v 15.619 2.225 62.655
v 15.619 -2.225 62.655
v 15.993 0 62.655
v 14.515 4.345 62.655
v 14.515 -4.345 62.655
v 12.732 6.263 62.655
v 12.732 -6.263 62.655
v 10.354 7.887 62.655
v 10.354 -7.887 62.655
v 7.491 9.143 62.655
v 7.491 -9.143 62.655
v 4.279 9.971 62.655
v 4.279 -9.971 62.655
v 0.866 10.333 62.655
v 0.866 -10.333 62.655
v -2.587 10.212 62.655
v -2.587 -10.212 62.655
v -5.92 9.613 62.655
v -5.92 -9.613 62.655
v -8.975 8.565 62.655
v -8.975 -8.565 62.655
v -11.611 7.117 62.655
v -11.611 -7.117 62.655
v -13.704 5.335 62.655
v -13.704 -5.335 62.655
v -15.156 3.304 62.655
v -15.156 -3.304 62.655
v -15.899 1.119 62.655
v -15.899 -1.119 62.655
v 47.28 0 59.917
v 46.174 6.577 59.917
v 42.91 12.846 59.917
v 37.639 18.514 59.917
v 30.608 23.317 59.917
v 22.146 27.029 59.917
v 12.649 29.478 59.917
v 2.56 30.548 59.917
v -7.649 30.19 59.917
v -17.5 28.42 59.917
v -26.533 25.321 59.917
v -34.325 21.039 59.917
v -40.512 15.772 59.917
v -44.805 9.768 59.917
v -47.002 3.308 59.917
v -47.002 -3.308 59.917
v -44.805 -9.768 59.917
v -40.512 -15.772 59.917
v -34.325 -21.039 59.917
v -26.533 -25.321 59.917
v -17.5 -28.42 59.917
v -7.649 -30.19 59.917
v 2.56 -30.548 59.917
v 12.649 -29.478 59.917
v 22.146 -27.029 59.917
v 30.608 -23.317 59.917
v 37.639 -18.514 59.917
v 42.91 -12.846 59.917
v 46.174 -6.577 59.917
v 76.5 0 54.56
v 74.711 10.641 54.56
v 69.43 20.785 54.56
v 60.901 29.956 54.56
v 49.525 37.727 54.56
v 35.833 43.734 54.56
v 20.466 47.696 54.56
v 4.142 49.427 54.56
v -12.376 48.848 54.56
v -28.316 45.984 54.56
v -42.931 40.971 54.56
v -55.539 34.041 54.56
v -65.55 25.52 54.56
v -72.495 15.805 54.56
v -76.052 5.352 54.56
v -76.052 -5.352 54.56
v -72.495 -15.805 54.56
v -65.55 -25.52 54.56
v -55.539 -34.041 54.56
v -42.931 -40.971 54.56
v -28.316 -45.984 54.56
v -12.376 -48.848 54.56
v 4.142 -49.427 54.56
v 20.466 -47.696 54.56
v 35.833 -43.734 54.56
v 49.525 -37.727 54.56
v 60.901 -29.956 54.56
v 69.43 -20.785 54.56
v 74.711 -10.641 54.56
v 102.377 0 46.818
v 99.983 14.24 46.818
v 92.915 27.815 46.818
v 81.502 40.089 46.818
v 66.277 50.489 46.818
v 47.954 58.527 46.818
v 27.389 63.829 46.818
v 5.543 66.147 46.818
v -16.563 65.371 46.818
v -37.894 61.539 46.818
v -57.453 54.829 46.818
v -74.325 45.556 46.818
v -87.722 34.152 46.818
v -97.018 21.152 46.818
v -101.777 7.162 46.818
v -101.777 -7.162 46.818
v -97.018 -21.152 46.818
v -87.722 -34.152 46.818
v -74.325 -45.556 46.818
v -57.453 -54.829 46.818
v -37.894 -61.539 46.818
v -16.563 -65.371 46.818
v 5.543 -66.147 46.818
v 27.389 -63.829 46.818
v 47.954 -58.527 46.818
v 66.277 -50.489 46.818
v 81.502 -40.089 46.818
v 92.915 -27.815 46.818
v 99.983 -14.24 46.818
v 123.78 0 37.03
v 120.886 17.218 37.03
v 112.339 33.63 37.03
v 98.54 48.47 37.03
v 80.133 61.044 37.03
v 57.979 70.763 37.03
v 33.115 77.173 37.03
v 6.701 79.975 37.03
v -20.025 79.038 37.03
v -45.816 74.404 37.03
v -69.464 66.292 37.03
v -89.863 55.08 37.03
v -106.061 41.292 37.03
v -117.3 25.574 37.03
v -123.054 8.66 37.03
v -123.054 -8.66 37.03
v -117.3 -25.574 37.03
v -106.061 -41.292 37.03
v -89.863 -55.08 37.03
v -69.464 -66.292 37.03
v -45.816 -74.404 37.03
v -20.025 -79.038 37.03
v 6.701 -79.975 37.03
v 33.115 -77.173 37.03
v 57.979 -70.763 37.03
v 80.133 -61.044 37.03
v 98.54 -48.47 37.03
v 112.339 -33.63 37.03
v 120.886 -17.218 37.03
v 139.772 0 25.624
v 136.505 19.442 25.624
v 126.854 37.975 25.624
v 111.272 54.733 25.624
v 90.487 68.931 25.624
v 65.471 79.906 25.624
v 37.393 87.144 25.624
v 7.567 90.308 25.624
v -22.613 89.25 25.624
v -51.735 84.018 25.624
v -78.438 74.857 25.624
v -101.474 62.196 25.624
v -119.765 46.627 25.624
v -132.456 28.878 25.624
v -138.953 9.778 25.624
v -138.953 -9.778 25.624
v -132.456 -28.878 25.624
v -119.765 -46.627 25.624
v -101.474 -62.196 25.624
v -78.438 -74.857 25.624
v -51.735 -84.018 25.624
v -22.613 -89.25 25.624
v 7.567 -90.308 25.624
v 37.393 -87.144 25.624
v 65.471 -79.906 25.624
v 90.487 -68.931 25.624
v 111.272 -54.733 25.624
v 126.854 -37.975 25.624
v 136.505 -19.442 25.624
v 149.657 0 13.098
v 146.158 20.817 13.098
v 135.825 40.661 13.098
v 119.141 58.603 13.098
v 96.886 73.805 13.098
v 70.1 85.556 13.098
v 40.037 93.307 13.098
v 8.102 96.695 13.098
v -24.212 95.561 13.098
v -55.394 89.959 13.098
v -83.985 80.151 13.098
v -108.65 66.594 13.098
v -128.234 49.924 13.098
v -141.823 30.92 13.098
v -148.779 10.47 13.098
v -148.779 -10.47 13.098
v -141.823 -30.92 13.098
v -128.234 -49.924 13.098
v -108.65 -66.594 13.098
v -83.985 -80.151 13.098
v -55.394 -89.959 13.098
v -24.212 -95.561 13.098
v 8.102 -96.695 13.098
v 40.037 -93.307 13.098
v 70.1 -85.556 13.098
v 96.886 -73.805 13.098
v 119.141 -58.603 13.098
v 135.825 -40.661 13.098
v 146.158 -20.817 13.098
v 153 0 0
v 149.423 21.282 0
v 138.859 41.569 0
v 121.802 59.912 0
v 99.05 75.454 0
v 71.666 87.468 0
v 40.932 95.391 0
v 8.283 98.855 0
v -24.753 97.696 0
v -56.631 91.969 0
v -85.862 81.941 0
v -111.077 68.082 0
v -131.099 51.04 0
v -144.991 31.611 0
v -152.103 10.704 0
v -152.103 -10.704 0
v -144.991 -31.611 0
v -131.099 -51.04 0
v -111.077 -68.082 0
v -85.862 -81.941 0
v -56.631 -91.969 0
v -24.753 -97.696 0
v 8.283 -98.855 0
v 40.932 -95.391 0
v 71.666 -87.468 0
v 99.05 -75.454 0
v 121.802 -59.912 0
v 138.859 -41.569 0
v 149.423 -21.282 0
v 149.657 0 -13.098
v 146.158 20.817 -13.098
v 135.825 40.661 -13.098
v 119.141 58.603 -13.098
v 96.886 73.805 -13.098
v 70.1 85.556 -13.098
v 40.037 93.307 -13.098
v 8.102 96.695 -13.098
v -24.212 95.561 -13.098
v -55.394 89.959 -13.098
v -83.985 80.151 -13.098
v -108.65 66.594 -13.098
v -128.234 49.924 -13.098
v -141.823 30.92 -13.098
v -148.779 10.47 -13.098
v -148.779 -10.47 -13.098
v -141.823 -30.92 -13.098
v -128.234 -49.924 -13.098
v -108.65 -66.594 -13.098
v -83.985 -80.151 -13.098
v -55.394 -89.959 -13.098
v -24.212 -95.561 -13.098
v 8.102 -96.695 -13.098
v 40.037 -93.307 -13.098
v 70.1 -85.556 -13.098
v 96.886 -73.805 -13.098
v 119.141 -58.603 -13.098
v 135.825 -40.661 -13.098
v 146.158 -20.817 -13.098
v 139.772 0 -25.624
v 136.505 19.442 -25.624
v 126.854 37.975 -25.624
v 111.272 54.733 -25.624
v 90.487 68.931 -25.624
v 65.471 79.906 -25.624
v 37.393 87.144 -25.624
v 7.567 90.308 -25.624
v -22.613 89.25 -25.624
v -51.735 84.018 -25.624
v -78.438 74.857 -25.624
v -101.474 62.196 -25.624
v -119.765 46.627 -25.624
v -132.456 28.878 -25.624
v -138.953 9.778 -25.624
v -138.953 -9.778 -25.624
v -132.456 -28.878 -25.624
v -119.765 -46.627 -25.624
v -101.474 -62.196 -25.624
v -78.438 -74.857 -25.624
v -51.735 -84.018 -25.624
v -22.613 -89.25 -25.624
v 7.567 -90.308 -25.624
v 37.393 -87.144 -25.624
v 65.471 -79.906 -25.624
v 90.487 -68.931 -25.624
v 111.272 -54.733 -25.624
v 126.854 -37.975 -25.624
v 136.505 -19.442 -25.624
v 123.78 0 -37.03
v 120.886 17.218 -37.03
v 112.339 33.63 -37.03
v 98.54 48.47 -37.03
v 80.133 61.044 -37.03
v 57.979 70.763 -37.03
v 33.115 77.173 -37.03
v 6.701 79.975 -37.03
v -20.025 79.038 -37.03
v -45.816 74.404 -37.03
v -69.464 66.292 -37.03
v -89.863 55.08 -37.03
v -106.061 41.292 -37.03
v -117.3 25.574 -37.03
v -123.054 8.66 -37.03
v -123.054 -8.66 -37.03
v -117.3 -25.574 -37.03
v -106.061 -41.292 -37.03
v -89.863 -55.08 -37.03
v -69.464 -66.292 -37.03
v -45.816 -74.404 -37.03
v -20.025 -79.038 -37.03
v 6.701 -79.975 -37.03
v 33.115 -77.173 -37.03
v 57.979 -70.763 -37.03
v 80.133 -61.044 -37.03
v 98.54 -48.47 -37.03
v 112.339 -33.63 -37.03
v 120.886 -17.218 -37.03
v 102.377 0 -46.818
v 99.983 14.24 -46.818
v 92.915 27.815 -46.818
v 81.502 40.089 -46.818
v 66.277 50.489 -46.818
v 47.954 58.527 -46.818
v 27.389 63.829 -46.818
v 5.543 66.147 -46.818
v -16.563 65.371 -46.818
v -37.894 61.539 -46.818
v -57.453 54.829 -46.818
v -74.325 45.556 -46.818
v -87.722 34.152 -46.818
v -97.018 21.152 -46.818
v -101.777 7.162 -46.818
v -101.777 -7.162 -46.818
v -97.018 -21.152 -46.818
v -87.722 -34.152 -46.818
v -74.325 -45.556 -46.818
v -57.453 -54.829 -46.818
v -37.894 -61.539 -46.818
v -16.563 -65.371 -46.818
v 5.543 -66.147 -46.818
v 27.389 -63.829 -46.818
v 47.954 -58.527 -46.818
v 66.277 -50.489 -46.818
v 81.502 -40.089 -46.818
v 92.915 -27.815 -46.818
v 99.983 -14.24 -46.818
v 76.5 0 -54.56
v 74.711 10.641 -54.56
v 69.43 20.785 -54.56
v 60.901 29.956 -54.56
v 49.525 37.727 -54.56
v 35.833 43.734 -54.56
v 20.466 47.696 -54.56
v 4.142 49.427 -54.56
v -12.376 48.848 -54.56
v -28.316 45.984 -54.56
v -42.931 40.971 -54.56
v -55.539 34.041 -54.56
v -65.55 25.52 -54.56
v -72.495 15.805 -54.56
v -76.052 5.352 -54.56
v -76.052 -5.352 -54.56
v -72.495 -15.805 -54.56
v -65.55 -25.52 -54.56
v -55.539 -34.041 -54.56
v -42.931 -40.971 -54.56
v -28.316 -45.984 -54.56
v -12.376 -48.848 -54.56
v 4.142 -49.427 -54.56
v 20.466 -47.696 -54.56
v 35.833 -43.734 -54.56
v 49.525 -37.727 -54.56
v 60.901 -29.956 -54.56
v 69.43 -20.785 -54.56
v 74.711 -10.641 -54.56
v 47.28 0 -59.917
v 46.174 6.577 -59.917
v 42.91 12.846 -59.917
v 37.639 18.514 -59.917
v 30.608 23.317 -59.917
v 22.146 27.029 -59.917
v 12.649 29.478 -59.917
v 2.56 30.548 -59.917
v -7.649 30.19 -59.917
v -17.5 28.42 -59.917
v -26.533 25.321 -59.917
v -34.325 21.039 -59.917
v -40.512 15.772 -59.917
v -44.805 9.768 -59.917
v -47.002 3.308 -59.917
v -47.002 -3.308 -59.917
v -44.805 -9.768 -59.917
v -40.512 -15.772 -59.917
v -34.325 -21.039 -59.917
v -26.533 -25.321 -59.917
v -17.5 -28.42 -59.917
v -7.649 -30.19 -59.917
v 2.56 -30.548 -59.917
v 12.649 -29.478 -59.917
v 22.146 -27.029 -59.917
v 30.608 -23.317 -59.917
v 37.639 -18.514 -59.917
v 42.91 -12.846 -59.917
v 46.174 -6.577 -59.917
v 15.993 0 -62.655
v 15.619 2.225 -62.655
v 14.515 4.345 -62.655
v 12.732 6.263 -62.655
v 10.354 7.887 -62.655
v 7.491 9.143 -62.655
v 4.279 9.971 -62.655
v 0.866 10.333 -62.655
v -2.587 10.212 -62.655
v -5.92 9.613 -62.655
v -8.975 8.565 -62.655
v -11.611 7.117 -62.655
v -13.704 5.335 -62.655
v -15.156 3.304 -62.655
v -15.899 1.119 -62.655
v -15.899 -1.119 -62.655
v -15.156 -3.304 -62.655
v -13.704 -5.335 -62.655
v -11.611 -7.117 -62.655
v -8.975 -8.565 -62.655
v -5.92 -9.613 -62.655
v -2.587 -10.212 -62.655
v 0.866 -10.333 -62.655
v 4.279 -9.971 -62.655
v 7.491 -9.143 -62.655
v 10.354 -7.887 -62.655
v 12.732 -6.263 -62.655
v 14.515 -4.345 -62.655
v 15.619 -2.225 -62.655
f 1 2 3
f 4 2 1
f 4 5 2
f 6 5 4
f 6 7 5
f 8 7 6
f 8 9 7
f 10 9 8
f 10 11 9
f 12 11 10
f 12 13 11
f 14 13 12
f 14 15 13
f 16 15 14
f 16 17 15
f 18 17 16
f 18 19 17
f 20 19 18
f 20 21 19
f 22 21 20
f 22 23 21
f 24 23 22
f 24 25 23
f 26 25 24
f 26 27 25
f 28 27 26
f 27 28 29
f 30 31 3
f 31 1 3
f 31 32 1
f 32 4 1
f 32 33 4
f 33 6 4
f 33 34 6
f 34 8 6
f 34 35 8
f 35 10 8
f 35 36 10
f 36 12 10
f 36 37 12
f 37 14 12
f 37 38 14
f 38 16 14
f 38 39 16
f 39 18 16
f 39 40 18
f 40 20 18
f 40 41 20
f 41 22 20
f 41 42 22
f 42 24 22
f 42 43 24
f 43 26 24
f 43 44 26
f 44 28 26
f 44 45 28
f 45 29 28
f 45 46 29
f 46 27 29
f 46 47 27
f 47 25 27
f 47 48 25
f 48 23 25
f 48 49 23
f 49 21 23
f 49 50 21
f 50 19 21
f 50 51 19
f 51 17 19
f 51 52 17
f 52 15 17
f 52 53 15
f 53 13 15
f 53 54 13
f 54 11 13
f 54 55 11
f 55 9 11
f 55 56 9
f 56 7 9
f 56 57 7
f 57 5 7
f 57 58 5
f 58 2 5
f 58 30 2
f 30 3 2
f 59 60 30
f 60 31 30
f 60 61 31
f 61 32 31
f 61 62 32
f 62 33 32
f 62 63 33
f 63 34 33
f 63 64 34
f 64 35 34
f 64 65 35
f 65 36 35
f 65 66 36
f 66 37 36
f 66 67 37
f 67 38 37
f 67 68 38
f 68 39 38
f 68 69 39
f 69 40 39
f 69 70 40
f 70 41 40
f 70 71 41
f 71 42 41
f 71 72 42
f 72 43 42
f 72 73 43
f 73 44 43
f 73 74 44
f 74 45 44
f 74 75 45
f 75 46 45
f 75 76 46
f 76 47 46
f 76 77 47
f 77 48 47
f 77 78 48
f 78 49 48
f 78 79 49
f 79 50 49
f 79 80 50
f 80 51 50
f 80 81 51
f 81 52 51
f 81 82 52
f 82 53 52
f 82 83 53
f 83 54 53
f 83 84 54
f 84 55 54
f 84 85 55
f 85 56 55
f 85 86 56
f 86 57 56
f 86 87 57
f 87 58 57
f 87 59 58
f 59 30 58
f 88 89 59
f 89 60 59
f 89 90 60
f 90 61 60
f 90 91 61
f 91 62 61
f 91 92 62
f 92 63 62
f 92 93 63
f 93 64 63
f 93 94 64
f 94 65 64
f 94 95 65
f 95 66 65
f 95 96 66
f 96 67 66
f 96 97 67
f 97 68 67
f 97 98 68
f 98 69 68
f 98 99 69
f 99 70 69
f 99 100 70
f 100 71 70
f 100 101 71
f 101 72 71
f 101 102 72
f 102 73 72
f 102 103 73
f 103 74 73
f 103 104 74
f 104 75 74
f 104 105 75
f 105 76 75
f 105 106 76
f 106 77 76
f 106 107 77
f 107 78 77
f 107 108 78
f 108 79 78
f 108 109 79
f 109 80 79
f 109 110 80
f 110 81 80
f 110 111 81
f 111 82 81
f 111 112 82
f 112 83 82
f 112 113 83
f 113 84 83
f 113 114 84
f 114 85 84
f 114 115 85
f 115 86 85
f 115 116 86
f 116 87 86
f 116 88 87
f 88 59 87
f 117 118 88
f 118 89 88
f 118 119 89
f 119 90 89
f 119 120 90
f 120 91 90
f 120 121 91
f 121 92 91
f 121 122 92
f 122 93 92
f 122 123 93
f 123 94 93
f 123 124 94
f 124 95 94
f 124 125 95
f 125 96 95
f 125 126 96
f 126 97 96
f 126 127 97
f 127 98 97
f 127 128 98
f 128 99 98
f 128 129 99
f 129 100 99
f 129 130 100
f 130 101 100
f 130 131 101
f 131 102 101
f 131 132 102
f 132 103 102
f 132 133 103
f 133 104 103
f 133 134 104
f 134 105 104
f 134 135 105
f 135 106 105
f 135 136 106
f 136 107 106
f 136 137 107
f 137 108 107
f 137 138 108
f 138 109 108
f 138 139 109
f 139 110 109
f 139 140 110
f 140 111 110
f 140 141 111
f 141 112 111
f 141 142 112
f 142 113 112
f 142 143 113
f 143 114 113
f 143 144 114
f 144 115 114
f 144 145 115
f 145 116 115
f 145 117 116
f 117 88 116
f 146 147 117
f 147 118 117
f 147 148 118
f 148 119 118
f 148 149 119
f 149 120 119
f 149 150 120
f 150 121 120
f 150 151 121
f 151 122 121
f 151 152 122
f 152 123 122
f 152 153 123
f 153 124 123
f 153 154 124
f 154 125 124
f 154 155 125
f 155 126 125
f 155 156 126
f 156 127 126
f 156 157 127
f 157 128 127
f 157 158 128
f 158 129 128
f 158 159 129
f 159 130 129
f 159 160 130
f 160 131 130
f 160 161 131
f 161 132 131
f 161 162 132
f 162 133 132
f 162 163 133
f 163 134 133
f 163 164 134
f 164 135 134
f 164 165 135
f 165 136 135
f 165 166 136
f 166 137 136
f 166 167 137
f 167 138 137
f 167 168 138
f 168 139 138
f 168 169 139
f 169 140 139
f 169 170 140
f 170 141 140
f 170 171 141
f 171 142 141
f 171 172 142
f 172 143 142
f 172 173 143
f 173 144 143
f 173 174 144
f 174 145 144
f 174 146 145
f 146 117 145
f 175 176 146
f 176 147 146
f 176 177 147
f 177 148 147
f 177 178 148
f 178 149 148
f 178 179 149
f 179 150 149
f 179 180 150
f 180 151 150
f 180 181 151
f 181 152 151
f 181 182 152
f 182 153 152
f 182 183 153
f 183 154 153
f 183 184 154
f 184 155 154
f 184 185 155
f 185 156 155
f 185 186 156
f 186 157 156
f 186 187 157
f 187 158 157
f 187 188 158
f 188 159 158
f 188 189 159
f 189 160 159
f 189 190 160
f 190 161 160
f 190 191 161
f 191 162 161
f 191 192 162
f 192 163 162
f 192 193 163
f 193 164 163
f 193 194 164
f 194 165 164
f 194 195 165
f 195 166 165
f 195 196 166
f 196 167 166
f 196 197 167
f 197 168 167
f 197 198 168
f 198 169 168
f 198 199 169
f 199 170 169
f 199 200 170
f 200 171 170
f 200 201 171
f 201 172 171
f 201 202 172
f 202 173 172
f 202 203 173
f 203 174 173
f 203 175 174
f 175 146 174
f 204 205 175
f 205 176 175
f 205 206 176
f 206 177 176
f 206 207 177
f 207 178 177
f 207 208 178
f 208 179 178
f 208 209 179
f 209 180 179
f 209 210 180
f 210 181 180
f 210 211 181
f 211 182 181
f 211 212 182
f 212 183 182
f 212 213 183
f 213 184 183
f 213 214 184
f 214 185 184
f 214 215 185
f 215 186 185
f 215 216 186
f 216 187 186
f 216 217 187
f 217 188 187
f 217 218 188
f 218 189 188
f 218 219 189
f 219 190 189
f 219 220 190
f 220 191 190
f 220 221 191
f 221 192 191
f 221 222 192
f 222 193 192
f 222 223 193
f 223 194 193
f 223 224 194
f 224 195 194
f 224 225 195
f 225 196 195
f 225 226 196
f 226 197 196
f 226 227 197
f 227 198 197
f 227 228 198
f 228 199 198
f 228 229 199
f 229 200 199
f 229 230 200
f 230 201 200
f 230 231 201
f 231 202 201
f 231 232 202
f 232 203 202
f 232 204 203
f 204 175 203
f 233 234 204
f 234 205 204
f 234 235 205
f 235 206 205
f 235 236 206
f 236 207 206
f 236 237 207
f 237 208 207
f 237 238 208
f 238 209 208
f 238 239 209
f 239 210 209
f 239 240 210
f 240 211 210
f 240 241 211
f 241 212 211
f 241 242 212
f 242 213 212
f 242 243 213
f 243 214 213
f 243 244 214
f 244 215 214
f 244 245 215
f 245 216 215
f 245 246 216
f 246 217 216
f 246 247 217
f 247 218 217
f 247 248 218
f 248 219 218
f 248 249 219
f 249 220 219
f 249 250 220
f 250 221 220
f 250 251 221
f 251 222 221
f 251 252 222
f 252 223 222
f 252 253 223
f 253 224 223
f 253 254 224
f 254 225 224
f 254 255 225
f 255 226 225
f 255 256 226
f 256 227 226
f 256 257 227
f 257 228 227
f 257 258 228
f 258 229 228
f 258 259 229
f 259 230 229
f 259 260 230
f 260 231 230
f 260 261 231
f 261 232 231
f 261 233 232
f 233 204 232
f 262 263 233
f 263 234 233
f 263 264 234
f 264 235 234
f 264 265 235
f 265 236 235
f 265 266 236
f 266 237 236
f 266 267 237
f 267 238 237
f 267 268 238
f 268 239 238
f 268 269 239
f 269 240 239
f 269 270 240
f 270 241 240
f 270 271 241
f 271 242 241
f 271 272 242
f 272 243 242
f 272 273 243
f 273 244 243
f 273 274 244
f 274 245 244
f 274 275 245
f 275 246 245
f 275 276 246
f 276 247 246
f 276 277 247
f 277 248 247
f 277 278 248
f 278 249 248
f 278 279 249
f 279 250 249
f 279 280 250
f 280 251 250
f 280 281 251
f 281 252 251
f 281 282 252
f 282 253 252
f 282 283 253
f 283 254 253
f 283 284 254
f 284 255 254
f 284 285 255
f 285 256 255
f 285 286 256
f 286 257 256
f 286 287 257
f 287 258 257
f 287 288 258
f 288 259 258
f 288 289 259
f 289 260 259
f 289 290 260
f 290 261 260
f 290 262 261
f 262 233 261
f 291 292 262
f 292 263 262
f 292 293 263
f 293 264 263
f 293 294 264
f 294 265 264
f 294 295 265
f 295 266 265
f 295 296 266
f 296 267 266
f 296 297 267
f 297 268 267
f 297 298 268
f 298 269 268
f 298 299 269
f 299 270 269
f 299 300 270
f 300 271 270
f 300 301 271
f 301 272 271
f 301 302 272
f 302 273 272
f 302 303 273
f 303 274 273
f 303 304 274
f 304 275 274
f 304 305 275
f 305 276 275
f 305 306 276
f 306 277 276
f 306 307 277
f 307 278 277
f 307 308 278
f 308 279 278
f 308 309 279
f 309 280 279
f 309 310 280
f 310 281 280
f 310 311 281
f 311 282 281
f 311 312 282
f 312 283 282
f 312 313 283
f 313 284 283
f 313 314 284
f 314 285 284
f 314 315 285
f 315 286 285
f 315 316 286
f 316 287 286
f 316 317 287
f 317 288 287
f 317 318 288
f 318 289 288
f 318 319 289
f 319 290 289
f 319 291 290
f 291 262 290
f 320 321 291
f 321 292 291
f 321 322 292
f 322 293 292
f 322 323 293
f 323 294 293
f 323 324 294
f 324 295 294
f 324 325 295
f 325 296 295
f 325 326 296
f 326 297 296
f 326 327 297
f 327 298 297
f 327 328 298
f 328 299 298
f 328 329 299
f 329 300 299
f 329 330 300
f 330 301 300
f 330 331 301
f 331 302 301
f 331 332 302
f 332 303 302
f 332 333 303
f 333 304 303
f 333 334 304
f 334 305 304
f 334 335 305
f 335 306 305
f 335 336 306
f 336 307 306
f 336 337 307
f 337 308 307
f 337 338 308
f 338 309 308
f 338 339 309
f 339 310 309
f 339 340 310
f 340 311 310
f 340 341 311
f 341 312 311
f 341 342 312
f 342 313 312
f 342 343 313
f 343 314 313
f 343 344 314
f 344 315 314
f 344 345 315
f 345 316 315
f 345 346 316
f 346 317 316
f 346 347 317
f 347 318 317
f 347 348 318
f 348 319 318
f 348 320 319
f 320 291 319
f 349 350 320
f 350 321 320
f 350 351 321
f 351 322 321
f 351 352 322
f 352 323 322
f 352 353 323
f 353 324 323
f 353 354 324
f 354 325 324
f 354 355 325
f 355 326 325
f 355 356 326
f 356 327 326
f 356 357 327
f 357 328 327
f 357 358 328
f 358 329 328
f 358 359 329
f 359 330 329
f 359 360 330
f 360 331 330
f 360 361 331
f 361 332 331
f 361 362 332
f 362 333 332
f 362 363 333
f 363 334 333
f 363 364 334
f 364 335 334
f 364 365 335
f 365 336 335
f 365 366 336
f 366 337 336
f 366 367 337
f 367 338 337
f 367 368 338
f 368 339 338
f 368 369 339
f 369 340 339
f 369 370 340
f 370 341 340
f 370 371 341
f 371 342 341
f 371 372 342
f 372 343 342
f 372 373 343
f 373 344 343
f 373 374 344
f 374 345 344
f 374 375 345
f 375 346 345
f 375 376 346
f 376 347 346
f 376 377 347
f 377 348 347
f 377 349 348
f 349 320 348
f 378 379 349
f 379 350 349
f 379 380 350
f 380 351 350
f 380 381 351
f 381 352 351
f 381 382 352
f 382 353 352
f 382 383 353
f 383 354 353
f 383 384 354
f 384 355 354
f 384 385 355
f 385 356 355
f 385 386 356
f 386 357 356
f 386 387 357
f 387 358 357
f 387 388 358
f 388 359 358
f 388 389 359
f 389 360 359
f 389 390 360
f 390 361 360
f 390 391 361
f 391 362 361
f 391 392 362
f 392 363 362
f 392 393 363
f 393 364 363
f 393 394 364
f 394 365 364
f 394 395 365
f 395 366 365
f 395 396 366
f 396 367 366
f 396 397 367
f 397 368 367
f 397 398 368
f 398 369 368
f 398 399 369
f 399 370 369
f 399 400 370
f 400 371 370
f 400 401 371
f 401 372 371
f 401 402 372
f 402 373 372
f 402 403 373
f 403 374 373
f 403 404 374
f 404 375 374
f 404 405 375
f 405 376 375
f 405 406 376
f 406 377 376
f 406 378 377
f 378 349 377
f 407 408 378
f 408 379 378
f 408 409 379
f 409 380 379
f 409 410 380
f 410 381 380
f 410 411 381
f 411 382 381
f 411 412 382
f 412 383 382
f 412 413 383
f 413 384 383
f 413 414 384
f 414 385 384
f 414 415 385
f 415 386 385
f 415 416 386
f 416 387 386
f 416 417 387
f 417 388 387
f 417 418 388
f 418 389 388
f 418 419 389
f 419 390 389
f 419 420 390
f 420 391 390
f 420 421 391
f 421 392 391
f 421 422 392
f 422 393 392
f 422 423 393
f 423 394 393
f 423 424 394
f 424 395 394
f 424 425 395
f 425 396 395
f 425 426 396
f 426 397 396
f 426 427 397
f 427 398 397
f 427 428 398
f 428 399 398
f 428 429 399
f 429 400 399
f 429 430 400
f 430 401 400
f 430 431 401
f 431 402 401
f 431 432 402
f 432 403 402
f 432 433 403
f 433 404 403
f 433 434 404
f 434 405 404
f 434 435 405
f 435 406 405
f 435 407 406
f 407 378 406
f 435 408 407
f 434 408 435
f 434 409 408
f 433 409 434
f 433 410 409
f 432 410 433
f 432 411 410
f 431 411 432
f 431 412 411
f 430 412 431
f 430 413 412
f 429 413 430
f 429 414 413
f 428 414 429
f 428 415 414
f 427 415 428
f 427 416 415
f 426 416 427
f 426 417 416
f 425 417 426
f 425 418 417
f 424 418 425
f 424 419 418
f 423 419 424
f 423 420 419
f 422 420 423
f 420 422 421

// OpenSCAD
// Generated by SolidPython 1.0.1 on 2020-07-29 00:46:53


scale(v = [17, 11, 7]) {
	sphere(r = 9);
}
/***********************************************
*********      SolidPython code:      **********
************************************************
 
# import packages: SolidPython
from solid import *
from solid.utils import *
from itertools import chain, combinations, permutations


class Resize:

    def __init__(self, scad_file):
        self.scad_file = scad_file
        #self.scad_file = import_scad(scad_file)
        # cone/cylinder param:
        self.r1 = 0
        self.r2 = 0
        self.h = 0
        # rectangular prism param:
        self.w = 0
        self.l = 0
        # ellipse param:
        self.r = 0

    # import OpenScad code (file name corresponds to shape)


    # classify shape + parameters
    def assign(self, param1, param2, param3):
        if self.scad_file == 'cone.scad':
            self.r1 = param1
            self.r2 = param2
            self.h = param3
        elif self.scad_file == 'cylinder.scad':
            self.r1 = param1
            self.r2 = param2
            self.h = param3
        elif self.scad_file == 'rectangularPrism.scad':
            self.h = param1
            self.l = param2
            self.w = param3
        else:
            self.r = param1
            self.h = param2

    # resize parameters
    def iterate(self):
        x = range(3, 20, 2)
        i = 1
        if self.scad_file == 'cone.scad':
            tempList = list(permutations(x, 2))
            for temp in tempList:
                param1 = temp[0]
                param2 = temp[1]
                filepath = 'produced_scad_files/' + 'cone' + str(param1) + '_' + str(param2) + '_' + '.scad'
                scad_render_to_file(cylinder(h=param1, r1=param2, r2=0), filepath)

        elif self.scad_file == 'cylinder.scad':
            tempList = list(permutations(x, 3))
            for temp in tempList:
                param1 = temp[0]
                param2 = temp[1]
                filepath = 'produced_scad_files/' + 'cylinder' + str(param1) + '_' + str(param2) + '_' + '.scad'
                scad_render_to_file(cylinder(h=param1, r1=param2, r2=param2), filepath)

        elif self.scad_file == 'rectangularPrism.scad':
            tempList = list(permutations(x, 3))
            for temp in tempList:
                param1 = temp[0]
                param2 = temp[1]
                param3 = temp[2]
                filepath = 'produced_scad_files/' + 'rectangularPrism' + str(param1) + '_' + str(param2) + '_' + str(
                    param3) + '.scad'
                scad_render_to_file(cube(size=(param1, param2, param3)), filepath)

        elif self.scad_file == 'ellipse.scad':
            tempList = list(permutations(x, 4))
            for temp in tempList:
                param1 = temp[0]
                param2 = temp[1]
                param3 = temp[2]
                param4 = temp[3]
                filepath = 'produced_scad_files/' + 'ellipse' + str(param1) + '_' + str(param2) + '_' + str(param3) + '_' + str(param4) + '.scad'
                scad_render_to_file(scale([param1, param2, param3])(sphere(r=param4)), filepath)

    def render_to_scadfile(self):
        scad_render_to_file(scad, 'example.scad') 
 
************************************************/
